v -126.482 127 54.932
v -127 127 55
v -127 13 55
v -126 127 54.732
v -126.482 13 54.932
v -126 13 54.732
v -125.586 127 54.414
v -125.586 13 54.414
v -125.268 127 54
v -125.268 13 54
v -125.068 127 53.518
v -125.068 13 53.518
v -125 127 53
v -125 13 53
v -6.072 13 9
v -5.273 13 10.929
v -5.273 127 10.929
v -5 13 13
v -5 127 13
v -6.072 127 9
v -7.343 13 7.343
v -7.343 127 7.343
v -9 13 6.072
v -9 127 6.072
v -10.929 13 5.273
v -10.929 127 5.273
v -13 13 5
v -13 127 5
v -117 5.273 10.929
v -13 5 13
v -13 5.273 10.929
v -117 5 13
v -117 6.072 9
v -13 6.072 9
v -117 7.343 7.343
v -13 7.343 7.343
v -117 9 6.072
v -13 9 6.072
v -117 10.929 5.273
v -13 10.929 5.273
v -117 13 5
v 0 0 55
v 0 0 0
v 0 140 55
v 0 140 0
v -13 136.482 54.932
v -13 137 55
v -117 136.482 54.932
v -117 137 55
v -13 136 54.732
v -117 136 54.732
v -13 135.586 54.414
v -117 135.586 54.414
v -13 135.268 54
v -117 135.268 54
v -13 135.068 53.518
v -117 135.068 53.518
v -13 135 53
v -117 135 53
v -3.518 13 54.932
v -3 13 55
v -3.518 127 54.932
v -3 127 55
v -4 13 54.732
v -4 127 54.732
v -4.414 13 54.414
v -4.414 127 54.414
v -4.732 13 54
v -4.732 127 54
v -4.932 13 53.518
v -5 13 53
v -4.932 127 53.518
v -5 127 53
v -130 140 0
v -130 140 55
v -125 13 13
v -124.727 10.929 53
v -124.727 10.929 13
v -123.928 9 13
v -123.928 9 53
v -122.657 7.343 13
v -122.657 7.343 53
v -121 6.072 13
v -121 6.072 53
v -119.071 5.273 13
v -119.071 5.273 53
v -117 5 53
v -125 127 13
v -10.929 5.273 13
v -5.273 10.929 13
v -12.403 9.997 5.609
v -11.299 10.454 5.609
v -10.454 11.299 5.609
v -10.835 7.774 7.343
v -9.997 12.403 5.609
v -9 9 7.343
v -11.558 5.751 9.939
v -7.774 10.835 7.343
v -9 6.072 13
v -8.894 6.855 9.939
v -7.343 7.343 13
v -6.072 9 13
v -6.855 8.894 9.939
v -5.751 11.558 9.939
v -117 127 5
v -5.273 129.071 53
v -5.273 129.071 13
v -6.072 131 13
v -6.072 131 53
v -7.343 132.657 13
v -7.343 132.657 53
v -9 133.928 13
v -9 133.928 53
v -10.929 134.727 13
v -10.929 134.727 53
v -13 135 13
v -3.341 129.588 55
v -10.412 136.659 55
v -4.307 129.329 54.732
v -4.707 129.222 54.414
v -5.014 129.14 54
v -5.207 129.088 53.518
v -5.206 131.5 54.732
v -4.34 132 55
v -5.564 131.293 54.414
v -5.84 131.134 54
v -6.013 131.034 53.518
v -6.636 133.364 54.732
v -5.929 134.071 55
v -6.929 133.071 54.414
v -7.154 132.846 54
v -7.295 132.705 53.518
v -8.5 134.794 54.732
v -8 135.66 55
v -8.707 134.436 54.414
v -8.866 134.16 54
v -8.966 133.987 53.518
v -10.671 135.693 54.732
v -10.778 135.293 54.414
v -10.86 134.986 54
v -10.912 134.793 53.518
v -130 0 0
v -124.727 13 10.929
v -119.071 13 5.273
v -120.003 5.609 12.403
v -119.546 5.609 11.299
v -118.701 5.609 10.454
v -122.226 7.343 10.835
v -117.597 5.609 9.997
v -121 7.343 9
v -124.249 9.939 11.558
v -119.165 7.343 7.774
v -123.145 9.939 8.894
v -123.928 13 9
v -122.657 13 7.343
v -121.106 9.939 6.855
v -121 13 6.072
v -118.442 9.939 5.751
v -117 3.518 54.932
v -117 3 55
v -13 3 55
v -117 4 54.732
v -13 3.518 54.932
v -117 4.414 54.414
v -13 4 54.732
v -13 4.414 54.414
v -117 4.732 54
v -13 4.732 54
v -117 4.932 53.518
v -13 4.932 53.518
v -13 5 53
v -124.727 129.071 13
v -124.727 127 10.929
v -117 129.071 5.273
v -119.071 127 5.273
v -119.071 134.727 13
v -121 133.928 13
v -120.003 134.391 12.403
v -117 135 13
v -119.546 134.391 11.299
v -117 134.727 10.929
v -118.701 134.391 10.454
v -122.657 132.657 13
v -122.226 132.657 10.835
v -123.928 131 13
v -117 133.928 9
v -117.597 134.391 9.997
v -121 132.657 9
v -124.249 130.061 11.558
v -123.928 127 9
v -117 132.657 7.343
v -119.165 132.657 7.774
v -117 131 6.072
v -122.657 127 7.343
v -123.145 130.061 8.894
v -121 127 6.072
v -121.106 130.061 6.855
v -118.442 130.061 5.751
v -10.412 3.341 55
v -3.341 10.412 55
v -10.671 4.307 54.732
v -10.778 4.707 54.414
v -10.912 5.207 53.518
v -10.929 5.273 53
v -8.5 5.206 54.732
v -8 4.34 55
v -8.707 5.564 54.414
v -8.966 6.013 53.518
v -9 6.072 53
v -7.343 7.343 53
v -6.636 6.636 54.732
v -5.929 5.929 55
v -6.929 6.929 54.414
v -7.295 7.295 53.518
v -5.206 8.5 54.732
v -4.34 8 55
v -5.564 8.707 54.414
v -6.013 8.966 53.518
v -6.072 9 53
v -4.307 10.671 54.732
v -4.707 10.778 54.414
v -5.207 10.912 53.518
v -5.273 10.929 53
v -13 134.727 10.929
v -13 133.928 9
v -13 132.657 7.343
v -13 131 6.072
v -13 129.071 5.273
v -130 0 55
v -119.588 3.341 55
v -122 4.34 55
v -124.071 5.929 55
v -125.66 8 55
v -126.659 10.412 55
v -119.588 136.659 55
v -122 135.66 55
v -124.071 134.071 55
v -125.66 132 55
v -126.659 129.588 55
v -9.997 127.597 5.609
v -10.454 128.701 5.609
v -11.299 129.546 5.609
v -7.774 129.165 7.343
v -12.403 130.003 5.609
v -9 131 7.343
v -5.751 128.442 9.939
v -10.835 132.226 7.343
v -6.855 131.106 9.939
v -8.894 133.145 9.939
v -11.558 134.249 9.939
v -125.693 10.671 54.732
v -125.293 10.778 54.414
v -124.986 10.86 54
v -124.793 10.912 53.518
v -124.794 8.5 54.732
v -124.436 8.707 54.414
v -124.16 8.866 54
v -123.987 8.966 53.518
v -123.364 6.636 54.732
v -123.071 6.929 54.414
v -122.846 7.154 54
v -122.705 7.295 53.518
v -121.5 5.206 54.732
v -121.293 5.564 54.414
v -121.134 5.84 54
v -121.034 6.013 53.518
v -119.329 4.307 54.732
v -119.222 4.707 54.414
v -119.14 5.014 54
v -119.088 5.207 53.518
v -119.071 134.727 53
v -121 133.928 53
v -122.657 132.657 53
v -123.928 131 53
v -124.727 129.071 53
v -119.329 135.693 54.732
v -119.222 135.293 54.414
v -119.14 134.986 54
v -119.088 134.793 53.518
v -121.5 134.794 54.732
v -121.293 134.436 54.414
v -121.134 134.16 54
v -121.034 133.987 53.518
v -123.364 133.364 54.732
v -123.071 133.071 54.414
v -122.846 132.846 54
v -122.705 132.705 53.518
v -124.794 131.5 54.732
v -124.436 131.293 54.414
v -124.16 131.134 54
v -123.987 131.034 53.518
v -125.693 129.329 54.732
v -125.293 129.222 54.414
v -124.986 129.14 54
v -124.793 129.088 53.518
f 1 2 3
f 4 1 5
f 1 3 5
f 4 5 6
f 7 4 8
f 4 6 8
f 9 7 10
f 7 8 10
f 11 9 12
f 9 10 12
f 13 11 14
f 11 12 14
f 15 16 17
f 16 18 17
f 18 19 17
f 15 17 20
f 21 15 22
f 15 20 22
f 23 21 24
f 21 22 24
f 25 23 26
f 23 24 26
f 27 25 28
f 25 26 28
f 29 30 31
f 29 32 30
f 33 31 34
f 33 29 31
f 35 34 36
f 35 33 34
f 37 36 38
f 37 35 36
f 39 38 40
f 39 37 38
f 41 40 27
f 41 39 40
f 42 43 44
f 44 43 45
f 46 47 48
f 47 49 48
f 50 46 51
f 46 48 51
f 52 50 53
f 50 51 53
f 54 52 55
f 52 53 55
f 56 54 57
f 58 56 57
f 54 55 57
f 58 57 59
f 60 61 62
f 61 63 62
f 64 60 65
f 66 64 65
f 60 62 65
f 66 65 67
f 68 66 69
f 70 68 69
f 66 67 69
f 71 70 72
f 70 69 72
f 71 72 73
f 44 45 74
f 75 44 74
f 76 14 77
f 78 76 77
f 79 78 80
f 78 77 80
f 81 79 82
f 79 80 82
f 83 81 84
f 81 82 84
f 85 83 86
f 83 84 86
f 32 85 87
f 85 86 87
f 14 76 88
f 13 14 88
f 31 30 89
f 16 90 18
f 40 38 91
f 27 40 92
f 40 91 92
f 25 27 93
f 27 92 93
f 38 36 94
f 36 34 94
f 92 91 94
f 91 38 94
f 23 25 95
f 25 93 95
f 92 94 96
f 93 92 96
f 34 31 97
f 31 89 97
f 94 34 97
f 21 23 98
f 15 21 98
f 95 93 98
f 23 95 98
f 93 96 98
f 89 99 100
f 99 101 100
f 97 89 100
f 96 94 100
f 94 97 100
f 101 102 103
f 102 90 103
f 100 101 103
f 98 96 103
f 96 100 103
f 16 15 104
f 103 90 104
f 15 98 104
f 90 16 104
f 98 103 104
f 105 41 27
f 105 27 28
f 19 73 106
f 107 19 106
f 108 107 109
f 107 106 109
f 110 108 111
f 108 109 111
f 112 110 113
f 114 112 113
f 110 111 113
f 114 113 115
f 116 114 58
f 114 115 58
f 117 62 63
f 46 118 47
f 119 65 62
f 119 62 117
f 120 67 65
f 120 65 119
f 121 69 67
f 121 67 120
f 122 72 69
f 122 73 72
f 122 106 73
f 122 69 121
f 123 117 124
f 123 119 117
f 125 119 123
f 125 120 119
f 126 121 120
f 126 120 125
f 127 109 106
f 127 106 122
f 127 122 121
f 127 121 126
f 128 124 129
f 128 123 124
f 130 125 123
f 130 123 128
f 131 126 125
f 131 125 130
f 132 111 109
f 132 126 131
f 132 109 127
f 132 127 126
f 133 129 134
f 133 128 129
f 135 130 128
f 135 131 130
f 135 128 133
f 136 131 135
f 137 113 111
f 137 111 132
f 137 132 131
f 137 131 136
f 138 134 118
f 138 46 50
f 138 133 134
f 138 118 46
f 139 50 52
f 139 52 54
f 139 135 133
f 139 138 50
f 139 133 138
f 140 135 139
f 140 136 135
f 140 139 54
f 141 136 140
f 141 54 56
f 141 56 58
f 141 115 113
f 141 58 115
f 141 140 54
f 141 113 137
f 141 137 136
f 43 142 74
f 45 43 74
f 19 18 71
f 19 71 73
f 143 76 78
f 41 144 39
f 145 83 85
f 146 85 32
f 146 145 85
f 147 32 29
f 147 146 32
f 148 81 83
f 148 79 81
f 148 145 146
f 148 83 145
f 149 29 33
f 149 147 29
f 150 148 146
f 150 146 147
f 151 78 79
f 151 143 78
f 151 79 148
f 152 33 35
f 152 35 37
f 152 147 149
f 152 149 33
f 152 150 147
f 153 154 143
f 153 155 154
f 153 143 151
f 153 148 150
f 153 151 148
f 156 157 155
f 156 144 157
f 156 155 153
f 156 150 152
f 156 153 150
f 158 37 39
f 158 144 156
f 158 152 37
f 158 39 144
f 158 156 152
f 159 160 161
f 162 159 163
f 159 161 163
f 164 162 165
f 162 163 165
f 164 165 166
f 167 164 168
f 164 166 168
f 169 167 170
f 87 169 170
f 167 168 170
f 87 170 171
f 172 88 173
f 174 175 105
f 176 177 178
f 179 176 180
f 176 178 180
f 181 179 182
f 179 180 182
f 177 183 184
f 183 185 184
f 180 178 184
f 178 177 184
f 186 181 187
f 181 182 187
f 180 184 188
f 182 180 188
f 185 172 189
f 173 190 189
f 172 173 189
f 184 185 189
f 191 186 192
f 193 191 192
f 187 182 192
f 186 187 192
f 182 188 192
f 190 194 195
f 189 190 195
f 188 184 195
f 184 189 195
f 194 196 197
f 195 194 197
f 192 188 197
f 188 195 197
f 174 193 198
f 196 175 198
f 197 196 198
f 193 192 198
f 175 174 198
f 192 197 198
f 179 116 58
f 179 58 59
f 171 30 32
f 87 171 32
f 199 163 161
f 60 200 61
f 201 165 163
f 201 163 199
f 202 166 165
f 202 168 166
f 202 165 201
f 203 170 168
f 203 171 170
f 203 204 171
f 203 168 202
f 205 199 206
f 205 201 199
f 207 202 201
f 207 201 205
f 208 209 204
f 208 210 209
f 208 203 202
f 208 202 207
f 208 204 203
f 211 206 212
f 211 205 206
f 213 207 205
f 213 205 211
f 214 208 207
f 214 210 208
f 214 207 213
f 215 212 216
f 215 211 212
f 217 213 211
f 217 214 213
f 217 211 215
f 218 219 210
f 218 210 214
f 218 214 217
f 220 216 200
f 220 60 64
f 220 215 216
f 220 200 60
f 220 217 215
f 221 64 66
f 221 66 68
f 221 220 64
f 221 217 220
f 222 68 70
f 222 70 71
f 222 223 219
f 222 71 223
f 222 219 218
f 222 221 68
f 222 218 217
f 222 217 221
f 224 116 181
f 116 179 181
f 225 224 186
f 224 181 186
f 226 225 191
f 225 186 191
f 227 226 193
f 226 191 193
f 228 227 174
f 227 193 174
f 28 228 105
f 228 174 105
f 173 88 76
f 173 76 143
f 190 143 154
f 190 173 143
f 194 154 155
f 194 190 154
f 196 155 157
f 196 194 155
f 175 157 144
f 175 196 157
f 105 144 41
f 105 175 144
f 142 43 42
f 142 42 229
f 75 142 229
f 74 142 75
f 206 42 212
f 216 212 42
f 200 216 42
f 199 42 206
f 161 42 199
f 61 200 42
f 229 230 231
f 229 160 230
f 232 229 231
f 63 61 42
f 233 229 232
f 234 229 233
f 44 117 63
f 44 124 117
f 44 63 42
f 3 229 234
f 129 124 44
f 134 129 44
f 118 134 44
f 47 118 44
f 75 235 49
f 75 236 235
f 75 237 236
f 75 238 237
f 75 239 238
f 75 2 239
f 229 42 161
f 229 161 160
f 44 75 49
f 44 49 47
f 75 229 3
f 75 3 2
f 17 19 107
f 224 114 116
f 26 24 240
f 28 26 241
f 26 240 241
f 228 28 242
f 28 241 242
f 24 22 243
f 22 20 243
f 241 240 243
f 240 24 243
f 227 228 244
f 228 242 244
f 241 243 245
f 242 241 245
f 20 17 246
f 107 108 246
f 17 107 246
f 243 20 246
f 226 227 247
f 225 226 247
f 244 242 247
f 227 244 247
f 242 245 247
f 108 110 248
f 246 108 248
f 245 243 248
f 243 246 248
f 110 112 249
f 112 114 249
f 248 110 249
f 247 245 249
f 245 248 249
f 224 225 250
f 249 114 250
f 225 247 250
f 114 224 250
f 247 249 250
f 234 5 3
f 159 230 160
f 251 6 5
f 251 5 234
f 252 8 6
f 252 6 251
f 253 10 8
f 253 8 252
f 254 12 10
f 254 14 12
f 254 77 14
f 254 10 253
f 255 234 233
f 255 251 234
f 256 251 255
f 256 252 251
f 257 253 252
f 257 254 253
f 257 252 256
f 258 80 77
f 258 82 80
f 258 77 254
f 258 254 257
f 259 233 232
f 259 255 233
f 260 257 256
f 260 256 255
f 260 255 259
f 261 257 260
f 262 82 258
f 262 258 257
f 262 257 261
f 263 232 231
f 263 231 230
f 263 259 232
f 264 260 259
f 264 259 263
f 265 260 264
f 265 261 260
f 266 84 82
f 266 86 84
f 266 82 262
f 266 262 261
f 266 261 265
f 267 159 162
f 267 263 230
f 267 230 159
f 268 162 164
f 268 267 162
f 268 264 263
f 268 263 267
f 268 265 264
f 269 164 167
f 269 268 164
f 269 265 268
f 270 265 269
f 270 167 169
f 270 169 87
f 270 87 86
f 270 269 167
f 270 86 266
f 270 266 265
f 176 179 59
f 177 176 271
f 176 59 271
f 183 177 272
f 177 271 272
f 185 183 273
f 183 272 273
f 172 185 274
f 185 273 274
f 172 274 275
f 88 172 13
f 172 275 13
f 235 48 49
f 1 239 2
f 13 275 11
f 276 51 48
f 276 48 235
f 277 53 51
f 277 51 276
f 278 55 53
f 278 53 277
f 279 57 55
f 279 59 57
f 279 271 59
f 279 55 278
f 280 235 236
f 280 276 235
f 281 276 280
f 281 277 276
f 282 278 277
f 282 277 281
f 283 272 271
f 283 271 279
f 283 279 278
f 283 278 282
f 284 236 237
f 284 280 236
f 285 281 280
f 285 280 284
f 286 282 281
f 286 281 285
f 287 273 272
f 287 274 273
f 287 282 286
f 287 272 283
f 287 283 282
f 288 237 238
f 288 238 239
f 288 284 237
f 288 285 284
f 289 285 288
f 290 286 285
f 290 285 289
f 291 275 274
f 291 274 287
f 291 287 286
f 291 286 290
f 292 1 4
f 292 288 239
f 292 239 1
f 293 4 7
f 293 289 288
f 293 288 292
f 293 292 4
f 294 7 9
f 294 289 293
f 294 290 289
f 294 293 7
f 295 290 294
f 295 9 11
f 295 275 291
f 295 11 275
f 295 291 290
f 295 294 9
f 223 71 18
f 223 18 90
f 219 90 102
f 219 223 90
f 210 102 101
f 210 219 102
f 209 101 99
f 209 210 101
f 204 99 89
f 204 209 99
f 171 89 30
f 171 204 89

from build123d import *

# Parameters (mm, degrees)
IZIM1_W                     = 130
IZIM1_H                     = 120
Y_KSEKLIK_EKSTR_ZYON1_DEPTH = 5
IZIM1_3_W                   = 140
IZIM1_3_H                   = 130
IZIM1_3_W_2                 = 130
IZIM1_3_H_2                 = 120
Y_KSEKLIK_EKSTR_ZYON2_DEPTH = 55
RADYUS1_R                   = 8
RADYUS2_R                   = 2


with BuildPart() as part:
    # Çizim1 → Yükseklik-Ekstrüzyon1 (new body)
    with BuildSketch(Plane(origin=(0, 0, 0), x_dir=(0, 1, 0), z_dir=(0, 0, 1))):
        with Locations((70, 65)):
            Rectangle(IZIM1_W, IZIM1_H)
    extrude(amount=Y_KSEKLIK_EKSTR_ZYON1_DEPTH)

    # Çizim1<3> → Yükseklik-Ekstrüzyon2 (add)
    with BuildSketch(Plane(origin=(0, 0, 0), x_dir=(0, 1, 0), z_dir=(0, 0, 1))):
        with Locations((70, 65)):
            Rectangle(IZIM1_3_W, IZIM1_3_H)
        with Locations((70, 65)):
            Rectangle(IZIM1_3_W_2, IZIM1_3_H_2, mode=Mode.SUBTRACT)
    extrude(amount=Y_KSEKLIK_EKSTR_ZYON2_DEPTH)

    # Radyus1
    radyus1_edges = [part.edges().sort_by_distance(p)[0] for p in [
        (-125, 70, 5),
        (-5, 135, 30),
        (-125, 135, 30),
        (-125, 5, 30),
        (-5, 5, 30),
        (-65, 5, 5),
        (-5, 70, 5),
        (-65, 135, 5),
    ]]
    fillet(radyus1_edges, radius=RADYUS1_R)

    # Radyus2
    radyus2_edges = [part.edges().sort_by_distance(p)[0] for p in [
        (-5, 70, 55),
        (-65, 135, 55),
        (-125, 70, 55),
        (-65, 5, 55),
        (-7.343145751, 132.656854249, 55),
        (-122.656854249, 132.656854249, 55),
        (-122.656854249, 7.343145751, 55),
        (-7.343145751, 7.343145751, 55),
    ]]
    fillet(radyus2_edges, radius=RADYUS2_R)


solid = part.part
